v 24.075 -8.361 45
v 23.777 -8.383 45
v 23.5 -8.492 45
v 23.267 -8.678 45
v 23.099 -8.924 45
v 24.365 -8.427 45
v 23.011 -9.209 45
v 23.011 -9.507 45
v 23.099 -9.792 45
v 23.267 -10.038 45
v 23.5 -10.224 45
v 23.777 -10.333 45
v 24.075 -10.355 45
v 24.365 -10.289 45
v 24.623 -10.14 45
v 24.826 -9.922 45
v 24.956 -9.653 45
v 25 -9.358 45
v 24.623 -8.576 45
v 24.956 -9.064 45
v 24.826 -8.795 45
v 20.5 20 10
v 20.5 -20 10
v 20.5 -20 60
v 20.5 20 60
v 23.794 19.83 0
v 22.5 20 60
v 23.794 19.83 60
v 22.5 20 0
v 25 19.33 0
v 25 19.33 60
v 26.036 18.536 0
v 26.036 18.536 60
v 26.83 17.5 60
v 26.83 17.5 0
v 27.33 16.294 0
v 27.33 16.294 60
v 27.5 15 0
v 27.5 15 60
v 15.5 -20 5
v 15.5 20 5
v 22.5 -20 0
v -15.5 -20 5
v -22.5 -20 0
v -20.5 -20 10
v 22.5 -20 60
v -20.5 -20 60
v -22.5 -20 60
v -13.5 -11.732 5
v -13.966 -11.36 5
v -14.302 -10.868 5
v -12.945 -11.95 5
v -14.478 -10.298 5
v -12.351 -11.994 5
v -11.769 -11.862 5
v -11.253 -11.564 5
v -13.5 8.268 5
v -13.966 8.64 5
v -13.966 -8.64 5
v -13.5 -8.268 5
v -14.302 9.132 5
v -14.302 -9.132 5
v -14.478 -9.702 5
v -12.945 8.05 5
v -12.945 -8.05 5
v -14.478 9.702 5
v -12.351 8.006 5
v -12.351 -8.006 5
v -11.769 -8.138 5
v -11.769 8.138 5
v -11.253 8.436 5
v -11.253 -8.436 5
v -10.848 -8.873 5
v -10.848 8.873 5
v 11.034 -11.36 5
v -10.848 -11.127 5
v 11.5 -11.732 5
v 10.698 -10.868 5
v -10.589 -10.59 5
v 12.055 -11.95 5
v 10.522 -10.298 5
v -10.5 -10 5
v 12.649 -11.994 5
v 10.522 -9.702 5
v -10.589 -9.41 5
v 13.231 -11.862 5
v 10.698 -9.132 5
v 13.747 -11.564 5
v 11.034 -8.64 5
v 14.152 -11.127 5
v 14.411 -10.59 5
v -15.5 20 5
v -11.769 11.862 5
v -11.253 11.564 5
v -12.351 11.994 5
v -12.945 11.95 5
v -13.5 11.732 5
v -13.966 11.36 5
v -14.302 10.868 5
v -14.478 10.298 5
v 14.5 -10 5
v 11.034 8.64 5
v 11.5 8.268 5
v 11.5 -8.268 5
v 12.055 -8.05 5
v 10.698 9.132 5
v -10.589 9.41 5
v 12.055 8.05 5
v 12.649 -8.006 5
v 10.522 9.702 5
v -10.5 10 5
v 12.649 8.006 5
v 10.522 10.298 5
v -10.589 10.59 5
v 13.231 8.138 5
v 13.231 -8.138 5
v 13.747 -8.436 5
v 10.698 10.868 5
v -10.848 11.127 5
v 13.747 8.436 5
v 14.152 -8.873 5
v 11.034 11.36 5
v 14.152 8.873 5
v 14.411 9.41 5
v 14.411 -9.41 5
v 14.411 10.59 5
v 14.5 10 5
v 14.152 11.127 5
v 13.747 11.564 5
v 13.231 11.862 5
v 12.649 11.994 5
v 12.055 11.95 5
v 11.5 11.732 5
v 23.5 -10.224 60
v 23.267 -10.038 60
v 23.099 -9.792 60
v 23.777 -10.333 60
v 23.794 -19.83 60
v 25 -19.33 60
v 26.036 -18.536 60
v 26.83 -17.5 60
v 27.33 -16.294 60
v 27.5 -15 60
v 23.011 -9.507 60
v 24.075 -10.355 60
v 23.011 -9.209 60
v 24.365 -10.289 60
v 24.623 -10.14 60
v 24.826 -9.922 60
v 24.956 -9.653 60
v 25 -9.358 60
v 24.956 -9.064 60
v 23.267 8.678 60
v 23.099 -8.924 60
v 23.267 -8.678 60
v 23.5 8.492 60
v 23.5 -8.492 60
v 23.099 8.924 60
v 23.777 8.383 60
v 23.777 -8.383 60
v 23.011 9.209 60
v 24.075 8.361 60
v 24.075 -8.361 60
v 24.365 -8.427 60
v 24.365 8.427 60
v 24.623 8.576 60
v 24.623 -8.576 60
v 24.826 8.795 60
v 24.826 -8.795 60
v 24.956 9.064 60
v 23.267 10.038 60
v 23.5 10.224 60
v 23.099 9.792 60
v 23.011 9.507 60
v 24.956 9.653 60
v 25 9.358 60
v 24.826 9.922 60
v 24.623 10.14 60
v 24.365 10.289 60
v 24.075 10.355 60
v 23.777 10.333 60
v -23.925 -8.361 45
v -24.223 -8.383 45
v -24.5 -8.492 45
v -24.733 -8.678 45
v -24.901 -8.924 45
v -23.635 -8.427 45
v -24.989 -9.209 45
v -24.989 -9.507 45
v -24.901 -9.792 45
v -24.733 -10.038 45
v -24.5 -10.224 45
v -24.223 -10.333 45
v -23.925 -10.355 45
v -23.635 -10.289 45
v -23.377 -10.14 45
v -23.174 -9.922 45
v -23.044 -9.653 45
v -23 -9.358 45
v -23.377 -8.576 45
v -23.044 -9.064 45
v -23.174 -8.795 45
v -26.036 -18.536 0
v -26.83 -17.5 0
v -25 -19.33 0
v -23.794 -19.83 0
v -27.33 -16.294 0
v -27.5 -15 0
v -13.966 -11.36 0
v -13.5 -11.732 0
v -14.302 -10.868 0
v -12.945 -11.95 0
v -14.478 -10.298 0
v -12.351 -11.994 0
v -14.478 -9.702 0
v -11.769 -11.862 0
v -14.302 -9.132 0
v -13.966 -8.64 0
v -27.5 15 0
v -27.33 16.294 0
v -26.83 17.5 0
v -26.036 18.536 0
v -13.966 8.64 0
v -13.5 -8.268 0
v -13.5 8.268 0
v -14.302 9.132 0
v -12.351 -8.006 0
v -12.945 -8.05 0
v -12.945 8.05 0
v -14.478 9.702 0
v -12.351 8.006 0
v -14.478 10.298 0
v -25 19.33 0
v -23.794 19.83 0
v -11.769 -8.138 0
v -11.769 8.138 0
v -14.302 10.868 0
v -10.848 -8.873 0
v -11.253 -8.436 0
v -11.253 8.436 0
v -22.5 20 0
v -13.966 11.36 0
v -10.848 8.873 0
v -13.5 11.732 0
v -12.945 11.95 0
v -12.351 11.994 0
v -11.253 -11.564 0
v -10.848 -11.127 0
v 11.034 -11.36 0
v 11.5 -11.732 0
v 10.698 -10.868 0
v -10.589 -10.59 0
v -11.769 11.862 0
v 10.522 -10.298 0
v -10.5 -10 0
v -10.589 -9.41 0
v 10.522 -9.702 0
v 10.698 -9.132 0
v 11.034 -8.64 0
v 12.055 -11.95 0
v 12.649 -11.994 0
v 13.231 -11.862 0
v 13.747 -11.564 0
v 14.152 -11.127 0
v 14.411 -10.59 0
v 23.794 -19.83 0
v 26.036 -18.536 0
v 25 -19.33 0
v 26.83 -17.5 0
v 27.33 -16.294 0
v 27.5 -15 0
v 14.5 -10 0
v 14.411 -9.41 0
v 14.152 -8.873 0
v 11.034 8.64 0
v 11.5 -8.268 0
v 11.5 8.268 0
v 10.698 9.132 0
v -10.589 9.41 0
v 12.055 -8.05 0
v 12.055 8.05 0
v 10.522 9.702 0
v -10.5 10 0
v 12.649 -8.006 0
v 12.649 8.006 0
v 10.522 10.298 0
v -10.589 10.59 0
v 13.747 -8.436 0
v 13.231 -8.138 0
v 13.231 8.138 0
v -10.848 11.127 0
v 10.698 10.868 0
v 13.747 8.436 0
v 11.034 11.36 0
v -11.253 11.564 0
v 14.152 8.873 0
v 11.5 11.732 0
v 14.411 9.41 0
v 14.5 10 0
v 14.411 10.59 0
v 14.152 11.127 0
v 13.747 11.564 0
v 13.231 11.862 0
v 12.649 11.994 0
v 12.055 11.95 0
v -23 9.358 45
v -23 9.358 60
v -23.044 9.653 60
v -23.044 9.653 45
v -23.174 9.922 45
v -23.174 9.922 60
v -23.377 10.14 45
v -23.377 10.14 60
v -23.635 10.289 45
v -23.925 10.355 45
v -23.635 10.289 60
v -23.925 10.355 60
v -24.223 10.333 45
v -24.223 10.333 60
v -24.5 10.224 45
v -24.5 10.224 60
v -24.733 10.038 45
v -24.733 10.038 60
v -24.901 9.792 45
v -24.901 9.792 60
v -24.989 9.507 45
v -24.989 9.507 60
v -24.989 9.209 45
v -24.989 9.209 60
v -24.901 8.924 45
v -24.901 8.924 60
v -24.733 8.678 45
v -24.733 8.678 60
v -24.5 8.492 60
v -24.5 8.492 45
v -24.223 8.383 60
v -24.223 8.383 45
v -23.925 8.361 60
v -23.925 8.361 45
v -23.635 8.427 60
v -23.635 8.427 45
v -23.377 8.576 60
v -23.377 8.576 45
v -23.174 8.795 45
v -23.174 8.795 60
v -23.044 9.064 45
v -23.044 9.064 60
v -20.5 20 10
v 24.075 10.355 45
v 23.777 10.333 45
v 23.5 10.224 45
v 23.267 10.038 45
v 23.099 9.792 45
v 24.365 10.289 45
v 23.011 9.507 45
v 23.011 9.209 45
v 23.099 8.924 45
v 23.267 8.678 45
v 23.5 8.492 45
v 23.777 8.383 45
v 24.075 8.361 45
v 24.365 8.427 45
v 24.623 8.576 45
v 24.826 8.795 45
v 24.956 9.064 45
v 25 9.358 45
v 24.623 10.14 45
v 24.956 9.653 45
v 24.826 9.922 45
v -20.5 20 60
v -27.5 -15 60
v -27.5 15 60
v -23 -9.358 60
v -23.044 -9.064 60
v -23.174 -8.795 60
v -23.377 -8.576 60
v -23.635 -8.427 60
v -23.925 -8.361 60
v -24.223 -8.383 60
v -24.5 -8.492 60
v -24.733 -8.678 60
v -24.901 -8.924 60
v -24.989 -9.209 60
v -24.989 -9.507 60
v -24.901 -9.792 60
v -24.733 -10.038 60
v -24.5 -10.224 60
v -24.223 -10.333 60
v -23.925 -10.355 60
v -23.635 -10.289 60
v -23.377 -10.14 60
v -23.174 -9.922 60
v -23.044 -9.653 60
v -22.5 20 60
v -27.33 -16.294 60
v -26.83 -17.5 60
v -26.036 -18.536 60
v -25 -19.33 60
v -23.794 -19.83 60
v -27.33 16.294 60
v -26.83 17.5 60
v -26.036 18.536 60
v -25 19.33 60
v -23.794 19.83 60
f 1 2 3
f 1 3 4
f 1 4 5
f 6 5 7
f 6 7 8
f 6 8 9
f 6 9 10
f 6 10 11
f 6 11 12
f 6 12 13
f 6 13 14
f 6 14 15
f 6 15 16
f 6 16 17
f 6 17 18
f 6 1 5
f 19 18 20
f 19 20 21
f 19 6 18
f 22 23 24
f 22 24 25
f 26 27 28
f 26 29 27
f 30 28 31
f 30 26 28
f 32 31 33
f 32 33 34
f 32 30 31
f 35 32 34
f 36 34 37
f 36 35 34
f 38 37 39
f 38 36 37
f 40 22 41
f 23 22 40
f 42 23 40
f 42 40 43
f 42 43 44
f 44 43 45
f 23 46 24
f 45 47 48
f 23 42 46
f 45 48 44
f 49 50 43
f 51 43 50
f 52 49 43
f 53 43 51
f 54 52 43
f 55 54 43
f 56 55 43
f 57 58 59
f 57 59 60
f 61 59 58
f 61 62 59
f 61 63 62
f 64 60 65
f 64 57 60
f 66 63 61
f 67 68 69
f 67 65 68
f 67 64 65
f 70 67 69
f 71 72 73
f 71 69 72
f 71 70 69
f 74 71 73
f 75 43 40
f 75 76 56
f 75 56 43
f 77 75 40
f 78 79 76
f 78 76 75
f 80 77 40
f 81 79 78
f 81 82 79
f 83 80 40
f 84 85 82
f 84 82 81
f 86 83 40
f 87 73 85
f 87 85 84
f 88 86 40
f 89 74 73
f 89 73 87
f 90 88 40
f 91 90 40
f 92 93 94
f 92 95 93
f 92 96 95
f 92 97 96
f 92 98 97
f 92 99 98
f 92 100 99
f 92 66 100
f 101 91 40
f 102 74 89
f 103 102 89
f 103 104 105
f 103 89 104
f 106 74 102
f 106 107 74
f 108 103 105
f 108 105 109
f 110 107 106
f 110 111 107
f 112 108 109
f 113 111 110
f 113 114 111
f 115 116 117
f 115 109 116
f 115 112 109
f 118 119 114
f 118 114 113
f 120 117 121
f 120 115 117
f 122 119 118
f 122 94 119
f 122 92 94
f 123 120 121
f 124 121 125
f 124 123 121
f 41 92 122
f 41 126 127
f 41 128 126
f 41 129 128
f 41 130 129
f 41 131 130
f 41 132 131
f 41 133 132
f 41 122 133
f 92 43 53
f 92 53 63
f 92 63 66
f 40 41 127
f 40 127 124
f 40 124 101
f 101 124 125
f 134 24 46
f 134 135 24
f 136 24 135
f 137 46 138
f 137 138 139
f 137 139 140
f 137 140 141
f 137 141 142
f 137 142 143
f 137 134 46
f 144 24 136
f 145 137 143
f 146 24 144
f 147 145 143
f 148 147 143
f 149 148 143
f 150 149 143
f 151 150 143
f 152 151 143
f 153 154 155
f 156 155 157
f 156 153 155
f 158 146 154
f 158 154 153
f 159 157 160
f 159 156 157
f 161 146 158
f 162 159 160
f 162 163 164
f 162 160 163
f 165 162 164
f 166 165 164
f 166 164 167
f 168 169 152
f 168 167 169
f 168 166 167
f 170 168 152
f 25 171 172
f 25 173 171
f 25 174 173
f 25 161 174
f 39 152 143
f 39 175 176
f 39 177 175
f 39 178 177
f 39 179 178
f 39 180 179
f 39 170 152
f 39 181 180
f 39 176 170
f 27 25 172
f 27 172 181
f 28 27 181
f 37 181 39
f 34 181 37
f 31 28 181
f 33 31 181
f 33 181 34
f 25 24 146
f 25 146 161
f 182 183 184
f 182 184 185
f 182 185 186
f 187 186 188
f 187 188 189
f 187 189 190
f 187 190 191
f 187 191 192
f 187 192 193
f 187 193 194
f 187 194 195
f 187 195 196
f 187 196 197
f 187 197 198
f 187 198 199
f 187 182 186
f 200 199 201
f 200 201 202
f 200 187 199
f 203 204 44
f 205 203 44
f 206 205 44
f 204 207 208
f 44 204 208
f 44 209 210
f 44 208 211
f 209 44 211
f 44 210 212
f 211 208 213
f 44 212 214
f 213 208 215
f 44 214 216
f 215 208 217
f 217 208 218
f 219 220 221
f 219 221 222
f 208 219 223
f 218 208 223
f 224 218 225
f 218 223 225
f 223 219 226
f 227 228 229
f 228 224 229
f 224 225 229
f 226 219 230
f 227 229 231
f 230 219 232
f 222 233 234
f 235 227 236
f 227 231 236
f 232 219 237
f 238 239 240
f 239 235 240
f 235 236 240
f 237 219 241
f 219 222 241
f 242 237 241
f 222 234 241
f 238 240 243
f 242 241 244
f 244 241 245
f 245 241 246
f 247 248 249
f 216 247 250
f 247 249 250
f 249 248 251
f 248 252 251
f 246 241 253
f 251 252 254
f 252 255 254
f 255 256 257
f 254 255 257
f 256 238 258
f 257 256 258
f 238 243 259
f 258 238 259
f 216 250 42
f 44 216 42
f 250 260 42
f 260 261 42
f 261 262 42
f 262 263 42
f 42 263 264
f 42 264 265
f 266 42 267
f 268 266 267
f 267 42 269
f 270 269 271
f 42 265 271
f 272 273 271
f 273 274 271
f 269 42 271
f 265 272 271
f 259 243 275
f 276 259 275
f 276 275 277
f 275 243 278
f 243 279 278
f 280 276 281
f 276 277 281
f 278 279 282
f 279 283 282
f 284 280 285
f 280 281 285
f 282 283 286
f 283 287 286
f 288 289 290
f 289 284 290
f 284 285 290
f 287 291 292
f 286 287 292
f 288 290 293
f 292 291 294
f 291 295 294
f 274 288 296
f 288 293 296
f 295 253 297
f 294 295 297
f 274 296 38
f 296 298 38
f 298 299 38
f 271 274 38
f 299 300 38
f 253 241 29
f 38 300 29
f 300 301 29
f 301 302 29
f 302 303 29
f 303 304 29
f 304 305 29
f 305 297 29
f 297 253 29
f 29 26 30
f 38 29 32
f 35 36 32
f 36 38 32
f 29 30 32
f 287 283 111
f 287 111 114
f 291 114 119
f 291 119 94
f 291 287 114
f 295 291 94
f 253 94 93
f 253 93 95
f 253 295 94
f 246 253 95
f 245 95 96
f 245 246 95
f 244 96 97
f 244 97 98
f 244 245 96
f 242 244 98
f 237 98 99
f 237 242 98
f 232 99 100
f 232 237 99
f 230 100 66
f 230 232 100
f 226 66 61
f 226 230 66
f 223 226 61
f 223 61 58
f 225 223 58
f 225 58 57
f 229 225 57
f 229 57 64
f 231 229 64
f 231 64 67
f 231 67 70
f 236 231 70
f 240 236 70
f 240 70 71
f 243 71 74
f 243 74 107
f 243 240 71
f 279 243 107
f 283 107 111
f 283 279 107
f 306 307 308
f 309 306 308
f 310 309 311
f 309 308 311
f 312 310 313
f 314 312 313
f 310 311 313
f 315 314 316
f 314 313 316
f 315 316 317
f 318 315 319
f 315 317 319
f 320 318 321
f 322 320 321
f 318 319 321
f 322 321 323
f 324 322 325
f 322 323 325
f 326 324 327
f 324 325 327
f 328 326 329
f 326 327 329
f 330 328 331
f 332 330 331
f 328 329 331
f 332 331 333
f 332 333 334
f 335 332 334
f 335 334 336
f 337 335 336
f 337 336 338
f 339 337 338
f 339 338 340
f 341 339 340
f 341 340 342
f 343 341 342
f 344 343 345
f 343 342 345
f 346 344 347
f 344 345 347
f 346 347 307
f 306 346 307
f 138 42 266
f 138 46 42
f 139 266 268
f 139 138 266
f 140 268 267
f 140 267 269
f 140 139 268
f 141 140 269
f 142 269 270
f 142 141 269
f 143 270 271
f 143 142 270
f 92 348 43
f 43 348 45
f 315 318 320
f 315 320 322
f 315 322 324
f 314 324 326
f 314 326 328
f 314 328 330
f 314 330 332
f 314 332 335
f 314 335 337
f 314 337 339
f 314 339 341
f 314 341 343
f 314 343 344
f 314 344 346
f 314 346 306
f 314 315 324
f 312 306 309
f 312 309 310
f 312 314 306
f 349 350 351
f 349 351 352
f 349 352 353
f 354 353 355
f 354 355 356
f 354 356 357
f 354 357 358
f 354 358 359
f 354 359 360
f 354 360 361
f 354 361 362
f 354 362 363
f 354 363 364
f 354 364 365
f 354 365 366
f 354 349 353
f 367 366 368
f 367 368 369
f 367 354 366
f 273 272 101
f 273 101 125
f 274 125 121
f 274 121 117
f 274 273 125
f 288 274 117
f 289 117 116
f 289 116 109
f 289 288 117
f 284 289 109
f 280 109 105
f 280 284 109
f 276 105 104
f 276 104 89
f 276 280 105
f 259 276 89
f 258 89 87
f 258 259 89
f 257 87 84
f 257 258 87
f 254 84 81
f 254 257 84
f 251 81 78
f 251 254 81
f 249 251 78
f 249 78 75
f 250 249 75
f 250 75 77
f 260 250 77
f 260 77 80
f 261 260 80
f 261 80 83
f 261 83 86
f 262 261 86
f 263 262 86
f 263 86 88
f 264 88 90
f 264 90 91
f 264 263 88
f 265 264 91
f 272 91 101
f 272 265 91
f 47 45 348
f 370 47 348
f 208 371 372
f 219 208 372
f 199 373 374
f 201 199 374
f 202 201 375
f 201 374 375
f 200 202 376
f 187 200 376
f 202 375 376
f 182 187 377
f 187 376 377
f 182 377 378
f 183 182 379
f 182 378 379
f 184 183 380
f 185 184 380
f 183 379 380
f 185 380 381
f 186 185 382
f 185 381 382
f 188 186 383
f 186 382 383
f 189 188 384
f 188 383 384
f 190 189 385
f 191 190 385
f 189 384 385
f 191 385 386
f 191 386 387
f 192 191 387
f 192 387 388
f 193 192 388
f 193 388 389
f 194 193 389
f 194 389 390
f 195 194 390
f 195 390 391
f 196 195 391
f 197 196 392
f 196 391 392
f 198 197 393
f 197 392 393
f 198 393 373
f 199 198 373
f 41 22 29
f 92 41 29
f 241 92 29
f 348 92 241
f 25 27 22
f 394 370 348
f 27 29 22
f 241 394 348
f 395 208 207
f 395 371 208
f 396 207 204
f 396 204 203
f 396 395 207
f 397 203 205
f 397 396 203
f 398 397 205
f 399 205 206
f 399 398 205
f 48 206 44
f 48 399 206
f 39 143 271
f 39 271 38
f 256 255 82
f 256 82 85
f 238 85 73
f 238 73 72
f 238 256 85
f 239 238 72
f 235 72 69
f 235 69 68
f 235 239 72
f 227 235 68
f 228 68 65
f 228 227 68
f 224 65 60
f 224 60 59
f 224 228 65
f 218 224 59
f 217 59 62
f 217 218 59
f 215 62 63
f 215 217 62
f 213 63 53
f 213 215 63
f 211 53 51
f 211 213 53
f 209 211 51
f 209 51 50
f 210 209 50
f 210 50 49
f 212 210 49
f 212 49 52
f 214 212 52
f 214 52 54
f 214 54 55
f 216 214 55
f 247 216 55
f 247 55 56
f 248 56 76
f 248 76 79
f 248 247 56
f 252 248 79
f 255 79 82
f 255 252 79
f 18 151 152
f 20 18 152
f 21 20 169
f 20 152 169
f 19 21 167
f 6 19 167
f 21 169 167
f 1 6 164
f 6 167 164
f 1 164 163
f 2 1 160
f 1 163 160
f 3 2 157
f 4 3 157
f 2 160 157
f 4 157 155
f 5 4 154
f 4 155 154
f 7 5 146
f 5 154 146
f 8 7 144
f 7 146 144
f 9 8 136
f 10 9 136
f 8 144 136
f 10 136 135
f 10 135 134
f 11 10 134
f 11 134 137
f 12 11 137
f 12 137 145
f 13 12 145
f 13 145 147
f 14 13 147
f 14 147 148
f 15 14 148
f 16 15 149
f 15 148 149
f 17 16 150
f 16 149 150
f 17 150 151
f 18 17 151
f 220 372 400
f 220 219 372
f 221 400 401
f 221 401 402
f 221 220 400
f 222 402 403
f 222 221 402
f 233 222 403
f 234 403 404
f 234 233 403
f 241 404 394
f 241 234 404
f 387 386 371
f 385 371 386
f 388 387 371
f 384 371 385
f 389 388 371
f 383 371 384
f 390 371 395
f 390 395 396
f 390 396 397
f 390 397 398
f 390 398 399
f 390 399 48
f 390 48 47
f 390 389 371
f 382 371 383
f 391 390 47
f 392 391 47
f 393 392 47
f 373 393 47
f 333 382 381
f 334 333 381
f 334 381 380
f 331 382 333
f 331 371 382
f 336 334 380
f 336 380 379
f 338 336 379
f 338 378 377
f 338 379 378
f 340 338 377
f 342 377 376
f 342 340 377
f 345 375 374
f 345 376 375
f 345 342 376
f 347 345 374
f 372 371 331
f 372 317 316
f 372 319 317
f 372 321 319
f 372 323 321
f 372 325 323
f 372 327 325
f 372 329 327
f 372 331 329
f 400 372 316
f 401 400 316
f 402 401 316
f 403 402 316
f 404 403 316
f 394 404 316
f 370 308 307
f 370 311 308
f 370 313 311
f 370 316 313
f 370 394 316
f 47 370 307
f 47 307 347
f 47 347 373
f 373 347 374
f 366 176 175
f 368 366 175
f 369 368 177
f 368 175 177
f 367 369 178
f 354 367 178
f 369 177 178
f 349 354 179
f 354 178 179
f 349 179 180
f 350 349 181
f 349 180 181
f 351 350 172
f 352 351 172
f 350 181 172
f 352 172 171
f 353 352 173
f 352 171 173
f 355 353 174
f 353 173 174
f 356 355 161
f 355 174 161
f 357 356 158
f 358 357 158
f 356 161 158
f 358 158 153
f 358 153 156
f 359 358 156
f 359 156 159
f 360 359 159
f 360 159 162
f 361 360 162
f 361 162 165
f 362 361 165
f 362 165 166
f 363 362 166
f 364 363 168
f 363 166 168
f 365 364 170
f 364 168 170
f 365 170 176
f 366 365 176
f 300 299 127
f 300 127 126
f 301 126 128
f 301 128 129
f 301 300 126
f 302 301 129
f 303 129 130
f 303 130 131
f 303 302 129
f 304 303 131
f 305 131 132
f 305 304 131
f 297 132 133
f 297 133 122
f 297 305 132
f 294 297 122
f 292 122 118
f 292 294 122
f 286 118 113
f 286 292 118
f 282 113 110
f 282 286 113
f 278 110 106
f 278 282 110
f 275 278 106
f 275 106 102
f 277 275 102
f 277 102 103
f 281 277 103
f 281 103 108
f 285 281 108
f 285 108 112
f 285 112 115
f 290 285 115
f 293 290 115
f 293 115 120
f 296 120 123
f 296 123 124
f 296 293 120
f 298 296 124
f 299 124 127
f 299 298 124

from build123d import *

# Parameters (mm, degrees)
F0_W     = 55
F0_H     = 40
F0_R     = 2
F1_DEPTH = 5
F2_W     = 7
F2_H     = 40
F3_DEPTH = 55
F4_R     = 1
F5_DEPTH = 15
F6_R     = 5
F7_W     = 5
F7_H     = 5
F8_DEPTH = 40
F9_SIZE  = 4.99999


# Not quite as in the source:
# - a fillet or chamfer is up to 0.001 mm smaller than in the source, because OpenCascade refuses the exact size


with BuildPart() as f1:
    # F0 (on Top) → F1 (new body)
    with BuildSketch(Plane.XY):
        Rectangle(F0_W, F0_H)
        with Locations((-12.5, -10)):
            Circle(F0_R, mode=Mode.SUBTRACT)
        with Locations((12.5, -10)):
            Circle(F0_R, mode=Mode.SUBTRACT)
        with Locations((-12.5, 10)):
            Circle(F0_R, mode=Mode.SUBTRACT)
        with Locations((12.5, 10)):
            Circle(F0_R, mode=Mode.SUBTRACT)
    extrude(amount=F1_DEPTH)

    # F2 (on face) → F3 (join)
    with BuildSketch(Plane.XY.offset(5)):
        with Locations((-24, 0)):
            Rectangle(F2_W, F2_H)
        with Locations((24, 0)):
            Rectangle(F2_W, F2_H)
    extrude(amount=F3_DEPTH)

    # F4 (on face) → F5 (cut)
    with BuildSketch(Plane.XY.offset(60)):
        with Locations((-24, 9.358282201)):
            Circle(F4_R)
        with Locations((24, 9.358282201)):
            Circle(F4_R)
        with Locations((24, -9.358282201)):
            Circle(F4_R)
        with Locations((-24, -9.358282201)):
            Circle(F4_R)
    extrude(amount=-F5_DEPTH, mode=Mode.SUBTRACT)

    # F6
    f6_edges = [f1.edges().sort_by_distance(p)[0] for p in [
        (-27.5, 20, 30),
        (-27.5, -20, 30),
        (27.5, -20, 30),
        (27.5, 20, 30),
    ]]
    fillet(f6_edges, radius=F6_R)

    # F7 (on face) → F8 (join)
    with BuildSketch(Plane(origin=(0, 20, 0), x_dir=(-1, 0, 0), z_dir=(0, 1, 0))):
        with Locations((-18, 7.5)):
            Rectangle(F7_W, F7_H)
        with Locations((18, 7.5)):
            Rectangle(F7_W, F7_H)
    extrude(amount=-F8_DEPTH)

    # F9 (size 5 in the source; OpenCascade refuses exactly that, so slightly less here)
    f9_edges = [f1.edges().sort_by_distance(p)[0] for p in [
        (15.5, 0, 10),
        (-15.5, 0, 10),
    ]]
    chamfer(f9_edges, length=F9_SIZE)


solid = f1.part
